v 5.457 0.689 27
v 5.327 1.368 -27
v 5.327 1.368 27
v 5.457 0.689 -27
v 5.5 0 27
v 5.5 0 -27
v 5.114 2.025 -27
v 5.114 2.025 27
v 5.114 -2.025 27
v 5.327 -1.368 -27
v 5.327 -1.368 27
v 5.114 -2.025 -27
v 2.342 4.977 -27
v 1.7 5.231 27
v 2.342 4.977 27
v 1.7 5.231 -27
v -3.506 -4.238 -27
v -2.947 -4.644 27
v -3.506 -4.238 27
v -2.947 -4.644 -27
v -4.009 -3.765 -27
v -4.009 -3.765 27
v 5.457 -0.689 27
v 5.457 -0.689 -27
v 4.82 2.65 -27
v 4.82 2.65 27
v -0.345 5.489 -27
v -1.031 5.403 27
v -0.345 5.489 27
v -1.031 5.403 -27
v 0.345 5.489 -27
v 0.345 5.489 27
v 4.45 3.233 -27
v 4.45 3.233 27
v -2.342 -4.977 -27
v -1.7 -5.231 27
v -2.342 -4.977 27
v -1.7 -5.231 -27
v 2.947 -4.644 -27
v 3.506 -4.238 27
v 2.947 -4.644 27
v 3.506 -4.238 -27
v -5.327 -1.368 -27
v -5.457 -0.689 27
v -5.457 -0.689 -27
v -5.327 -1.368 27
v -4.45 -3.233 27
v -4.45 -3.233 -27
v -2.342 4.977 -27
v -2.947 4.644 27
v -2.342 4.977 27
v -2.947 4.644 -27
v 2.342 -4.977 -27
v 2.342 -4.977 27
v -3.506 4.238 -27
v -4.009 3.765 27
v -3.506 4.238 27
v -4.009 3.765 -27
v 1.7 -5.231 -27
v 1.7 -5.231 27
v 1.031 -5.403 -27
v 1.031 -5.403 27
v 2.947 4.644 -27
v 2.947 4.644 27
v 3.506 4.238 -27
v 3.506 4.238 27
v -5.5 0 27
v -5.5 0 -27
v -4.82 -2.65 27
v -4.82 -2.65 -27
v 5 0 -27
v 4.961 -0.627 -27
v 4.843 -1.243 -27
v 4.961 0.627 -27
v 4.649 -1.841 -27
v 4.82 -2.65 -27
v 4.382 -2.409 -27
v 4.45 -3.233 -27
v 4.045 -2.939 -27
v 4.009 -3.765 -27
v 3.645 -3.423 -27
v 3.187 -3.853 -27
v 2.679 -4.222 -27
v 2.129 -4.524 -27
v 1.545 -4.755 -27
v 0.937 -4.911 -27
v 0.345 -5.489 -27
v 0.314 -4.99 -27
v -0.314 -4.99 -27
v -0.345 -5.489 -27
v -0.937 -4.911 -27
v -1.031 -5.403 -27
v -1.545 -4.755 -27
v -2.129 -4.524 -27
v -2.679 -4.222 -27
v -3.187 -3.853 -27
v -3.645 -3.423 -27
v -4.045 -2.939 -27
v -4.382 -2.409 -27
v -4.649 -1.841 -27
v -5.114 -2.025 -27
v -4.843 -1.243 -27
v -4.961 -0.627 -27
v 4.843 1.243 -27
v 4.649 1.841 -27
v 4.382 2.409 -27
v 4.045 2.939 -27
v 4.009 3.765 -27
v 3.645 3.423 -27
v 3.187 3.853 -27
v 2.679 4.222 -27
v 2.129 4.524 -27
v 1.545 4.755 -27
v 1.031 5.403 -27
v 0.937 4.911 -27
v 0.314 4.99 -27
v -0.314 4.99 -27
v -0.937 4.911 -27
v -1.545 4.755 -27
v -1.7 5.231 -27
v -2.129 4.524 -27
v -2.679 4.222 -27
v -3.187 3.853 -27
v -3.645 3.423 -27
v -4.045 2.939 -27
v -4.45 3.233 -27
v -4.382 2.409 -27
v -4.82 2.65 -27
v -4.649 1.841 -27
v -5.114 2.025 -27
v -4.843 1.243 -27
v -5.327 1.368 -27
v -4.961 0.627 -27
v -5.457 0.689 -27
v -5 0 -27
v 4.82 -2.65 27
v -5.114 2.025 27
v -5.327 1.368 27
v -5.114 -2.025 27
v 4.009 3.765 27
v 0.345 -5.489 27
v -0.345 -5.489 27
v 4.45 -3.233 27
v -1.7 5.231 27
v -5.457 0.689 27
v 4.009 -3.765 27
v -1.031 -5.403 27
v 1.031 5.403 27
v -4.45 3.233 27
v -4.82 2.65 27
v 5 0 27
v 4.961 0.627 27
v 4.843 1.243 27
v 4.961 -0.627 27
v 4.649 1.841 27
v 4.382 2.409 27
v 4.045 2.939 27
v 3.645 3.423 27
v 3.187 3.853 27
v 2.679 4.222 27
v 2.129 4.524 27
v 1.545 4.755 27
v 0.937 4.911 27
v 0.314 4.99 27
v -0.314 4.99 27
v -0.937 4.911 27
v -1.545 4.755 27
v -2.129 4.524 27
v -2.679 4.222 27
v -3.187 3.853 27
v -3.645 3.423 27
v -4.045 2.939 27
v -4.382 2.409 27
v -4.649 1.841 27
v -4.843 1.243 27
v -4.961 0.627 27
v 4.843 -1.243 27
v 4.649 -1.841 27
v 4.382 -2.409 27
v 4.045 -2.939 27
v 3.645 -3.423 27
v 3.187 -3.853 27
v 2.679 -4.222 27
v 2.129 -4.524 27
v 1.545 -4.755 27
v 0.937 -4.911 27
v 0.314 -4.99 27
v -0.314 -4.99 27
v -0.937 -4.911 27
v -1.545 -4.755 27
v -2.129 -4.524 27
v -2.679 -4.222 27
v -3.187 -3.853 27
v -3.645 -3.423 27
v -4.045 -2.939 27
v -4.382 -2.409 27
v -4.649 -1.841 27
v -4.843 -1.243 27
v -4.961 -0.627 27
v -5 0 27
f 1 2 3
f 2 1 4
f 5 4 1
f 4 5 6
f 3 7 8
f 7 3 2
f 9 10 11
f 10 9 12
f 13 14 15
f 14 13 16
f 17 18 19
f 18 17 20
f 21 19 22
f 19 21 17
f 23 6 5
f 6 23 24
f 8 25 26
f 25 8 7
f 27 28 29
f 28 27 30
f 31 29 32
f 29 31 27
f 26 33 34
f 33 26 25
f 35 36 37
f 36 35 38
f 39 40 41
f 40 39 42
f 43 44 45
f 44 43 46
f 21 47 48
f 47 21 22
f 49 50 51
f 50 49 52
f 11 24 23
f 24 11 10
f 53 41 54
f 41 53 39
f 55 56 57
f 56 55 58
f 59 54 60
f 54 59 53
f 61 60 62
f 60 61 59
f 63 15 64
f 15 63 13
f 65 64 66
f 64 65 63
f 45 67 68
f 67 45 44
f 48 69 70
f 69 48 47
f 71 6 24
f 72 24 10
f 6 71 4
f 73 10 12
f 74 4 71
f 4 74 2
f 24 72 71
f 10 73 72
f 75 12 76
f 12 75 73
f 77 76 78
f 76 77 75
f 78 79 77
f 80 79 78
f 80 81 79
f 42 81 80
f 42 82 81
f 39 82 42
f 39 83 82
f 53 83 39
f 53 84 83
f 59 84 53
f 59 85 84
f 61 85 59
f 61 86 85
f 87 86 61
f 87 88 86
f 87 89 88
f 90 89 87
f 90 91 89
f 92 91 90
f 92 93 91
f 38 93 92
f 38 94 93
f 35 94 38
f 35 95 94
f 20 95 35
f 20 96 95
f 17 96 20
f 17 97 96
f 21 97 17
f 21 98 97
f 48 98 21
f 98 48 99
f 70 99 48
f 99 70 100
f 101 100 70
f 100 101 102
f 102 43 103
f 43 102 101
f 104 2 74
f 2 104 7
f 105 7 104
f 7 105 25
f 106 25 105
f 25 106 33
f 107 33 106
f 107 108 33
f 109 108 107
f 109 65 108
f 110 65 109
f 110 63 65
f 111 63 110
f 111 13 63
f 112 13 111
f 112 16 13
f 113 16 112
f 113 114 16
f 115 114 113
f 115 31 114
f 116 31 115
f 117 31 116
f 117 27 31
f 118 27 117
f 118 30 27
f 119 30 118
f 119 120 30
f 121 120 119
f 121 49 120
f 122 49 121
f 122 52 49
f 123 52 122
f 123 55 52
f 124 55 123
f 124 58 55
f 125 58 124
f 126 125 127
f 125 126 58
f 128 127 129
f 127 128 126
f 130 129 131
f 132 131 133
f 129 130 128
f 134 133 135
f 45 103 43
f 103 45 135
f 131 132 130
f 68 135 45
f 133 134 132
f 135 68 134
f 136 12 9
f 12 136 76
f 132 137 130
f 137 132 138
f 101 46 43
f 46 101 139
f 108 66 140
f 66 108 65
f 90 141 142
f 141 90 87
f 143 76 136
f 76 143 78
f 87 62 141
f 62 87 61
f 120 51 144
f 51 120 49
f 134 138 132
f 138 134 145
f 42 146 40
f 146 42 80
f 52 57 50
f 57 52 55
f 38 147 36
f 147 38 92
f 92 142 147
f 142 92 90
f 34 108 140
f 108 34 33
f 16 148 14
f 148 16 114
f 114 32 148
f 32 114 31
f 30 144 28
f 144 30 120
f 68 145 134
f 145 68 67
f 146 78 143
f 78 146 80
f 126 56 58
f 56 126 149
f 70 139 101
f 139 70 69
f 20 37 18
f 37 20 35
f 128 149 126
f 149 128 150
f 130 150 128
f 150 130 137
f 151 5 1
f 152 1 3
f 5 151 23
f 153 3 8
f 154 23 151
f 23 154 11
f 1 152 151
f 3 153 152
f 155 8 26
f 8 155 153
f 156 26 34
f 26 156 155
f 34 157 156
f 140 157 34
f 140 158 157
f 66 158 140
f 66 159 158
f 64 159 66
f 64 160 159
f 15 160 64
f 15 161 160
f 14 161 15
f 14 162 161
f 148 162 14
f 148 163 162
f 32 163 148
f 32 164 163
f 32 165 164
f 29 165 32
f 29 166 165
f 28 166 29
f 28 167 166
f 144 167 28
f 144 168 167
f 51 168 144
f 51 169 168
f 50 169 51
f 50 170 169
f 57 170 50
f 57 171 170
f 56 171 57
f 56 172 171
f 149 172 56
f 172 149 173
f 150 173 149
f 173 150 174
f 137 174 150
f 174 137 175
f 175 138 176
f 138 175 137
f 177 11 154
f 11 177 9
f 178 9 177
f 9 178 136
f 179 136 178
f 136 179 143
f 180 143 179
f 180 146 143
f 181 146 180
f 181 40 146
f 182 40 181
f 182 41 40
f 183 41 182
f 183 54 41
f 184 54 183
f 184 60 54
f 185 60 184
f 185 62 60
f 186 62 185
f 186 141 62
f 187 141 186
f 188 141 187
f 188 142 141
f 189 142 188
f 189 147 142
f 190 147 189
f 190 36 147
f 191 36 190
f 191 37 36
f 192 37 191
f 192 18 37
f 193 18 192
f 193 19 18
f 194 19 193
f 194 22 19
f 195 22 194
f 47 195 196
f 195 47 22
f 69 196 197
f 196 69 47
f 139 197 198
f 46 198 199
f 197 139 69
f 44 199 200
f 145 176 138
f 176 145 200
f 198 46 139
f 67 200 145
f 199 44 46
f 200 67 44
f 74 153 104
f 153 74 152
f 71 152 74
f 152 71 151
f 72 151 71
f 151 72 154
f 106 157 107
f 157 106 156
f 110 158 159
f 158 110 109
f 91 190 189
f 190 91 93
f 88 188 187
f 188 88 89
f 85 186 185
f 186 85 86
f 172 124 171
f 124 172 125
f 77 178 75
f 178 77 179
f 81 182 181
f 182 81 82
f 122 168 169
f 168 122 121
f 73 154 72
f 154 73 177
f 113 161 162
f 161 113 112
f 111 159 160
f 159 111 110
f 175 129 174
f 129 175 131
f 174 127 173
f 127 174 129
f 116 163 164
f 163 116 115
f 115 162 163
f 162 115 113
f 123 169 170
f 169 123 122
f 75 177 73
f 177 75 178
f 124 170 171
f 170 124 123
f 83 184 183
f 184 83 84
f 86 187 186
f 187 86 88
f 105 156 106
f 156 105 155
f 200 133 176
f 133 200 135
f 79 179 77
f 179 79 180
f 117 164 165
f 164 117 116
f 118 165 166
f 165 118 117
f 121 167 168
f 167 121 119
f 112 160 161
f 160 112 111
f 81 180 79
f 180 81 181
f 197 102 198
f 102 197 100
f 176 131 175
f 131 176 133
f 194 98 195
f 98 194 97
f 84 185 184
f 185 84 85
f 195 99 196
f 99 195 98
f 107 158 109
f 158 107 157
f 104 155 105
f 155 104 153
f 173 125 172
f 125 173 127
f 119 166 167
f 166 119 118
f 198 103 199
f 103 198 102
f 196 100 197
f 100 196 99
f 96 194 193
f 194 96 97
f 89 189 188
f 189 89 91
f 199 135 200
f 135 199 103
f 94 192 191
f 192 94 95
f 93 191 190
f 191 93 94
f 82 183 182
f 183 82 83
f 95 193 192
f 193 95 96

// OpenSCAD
$fn = 50;


difference() {
	union() {
		translate(v = [0, 0, -27.0000000000]) {
			cylinder(h = 54, r = 5.5000000000);
		}
	}
	union() {
		translate(v = [0, 0, -100.0000000000]) {
			cylinder(h = 200, r = 5.0000000000);
		}
	}
}
